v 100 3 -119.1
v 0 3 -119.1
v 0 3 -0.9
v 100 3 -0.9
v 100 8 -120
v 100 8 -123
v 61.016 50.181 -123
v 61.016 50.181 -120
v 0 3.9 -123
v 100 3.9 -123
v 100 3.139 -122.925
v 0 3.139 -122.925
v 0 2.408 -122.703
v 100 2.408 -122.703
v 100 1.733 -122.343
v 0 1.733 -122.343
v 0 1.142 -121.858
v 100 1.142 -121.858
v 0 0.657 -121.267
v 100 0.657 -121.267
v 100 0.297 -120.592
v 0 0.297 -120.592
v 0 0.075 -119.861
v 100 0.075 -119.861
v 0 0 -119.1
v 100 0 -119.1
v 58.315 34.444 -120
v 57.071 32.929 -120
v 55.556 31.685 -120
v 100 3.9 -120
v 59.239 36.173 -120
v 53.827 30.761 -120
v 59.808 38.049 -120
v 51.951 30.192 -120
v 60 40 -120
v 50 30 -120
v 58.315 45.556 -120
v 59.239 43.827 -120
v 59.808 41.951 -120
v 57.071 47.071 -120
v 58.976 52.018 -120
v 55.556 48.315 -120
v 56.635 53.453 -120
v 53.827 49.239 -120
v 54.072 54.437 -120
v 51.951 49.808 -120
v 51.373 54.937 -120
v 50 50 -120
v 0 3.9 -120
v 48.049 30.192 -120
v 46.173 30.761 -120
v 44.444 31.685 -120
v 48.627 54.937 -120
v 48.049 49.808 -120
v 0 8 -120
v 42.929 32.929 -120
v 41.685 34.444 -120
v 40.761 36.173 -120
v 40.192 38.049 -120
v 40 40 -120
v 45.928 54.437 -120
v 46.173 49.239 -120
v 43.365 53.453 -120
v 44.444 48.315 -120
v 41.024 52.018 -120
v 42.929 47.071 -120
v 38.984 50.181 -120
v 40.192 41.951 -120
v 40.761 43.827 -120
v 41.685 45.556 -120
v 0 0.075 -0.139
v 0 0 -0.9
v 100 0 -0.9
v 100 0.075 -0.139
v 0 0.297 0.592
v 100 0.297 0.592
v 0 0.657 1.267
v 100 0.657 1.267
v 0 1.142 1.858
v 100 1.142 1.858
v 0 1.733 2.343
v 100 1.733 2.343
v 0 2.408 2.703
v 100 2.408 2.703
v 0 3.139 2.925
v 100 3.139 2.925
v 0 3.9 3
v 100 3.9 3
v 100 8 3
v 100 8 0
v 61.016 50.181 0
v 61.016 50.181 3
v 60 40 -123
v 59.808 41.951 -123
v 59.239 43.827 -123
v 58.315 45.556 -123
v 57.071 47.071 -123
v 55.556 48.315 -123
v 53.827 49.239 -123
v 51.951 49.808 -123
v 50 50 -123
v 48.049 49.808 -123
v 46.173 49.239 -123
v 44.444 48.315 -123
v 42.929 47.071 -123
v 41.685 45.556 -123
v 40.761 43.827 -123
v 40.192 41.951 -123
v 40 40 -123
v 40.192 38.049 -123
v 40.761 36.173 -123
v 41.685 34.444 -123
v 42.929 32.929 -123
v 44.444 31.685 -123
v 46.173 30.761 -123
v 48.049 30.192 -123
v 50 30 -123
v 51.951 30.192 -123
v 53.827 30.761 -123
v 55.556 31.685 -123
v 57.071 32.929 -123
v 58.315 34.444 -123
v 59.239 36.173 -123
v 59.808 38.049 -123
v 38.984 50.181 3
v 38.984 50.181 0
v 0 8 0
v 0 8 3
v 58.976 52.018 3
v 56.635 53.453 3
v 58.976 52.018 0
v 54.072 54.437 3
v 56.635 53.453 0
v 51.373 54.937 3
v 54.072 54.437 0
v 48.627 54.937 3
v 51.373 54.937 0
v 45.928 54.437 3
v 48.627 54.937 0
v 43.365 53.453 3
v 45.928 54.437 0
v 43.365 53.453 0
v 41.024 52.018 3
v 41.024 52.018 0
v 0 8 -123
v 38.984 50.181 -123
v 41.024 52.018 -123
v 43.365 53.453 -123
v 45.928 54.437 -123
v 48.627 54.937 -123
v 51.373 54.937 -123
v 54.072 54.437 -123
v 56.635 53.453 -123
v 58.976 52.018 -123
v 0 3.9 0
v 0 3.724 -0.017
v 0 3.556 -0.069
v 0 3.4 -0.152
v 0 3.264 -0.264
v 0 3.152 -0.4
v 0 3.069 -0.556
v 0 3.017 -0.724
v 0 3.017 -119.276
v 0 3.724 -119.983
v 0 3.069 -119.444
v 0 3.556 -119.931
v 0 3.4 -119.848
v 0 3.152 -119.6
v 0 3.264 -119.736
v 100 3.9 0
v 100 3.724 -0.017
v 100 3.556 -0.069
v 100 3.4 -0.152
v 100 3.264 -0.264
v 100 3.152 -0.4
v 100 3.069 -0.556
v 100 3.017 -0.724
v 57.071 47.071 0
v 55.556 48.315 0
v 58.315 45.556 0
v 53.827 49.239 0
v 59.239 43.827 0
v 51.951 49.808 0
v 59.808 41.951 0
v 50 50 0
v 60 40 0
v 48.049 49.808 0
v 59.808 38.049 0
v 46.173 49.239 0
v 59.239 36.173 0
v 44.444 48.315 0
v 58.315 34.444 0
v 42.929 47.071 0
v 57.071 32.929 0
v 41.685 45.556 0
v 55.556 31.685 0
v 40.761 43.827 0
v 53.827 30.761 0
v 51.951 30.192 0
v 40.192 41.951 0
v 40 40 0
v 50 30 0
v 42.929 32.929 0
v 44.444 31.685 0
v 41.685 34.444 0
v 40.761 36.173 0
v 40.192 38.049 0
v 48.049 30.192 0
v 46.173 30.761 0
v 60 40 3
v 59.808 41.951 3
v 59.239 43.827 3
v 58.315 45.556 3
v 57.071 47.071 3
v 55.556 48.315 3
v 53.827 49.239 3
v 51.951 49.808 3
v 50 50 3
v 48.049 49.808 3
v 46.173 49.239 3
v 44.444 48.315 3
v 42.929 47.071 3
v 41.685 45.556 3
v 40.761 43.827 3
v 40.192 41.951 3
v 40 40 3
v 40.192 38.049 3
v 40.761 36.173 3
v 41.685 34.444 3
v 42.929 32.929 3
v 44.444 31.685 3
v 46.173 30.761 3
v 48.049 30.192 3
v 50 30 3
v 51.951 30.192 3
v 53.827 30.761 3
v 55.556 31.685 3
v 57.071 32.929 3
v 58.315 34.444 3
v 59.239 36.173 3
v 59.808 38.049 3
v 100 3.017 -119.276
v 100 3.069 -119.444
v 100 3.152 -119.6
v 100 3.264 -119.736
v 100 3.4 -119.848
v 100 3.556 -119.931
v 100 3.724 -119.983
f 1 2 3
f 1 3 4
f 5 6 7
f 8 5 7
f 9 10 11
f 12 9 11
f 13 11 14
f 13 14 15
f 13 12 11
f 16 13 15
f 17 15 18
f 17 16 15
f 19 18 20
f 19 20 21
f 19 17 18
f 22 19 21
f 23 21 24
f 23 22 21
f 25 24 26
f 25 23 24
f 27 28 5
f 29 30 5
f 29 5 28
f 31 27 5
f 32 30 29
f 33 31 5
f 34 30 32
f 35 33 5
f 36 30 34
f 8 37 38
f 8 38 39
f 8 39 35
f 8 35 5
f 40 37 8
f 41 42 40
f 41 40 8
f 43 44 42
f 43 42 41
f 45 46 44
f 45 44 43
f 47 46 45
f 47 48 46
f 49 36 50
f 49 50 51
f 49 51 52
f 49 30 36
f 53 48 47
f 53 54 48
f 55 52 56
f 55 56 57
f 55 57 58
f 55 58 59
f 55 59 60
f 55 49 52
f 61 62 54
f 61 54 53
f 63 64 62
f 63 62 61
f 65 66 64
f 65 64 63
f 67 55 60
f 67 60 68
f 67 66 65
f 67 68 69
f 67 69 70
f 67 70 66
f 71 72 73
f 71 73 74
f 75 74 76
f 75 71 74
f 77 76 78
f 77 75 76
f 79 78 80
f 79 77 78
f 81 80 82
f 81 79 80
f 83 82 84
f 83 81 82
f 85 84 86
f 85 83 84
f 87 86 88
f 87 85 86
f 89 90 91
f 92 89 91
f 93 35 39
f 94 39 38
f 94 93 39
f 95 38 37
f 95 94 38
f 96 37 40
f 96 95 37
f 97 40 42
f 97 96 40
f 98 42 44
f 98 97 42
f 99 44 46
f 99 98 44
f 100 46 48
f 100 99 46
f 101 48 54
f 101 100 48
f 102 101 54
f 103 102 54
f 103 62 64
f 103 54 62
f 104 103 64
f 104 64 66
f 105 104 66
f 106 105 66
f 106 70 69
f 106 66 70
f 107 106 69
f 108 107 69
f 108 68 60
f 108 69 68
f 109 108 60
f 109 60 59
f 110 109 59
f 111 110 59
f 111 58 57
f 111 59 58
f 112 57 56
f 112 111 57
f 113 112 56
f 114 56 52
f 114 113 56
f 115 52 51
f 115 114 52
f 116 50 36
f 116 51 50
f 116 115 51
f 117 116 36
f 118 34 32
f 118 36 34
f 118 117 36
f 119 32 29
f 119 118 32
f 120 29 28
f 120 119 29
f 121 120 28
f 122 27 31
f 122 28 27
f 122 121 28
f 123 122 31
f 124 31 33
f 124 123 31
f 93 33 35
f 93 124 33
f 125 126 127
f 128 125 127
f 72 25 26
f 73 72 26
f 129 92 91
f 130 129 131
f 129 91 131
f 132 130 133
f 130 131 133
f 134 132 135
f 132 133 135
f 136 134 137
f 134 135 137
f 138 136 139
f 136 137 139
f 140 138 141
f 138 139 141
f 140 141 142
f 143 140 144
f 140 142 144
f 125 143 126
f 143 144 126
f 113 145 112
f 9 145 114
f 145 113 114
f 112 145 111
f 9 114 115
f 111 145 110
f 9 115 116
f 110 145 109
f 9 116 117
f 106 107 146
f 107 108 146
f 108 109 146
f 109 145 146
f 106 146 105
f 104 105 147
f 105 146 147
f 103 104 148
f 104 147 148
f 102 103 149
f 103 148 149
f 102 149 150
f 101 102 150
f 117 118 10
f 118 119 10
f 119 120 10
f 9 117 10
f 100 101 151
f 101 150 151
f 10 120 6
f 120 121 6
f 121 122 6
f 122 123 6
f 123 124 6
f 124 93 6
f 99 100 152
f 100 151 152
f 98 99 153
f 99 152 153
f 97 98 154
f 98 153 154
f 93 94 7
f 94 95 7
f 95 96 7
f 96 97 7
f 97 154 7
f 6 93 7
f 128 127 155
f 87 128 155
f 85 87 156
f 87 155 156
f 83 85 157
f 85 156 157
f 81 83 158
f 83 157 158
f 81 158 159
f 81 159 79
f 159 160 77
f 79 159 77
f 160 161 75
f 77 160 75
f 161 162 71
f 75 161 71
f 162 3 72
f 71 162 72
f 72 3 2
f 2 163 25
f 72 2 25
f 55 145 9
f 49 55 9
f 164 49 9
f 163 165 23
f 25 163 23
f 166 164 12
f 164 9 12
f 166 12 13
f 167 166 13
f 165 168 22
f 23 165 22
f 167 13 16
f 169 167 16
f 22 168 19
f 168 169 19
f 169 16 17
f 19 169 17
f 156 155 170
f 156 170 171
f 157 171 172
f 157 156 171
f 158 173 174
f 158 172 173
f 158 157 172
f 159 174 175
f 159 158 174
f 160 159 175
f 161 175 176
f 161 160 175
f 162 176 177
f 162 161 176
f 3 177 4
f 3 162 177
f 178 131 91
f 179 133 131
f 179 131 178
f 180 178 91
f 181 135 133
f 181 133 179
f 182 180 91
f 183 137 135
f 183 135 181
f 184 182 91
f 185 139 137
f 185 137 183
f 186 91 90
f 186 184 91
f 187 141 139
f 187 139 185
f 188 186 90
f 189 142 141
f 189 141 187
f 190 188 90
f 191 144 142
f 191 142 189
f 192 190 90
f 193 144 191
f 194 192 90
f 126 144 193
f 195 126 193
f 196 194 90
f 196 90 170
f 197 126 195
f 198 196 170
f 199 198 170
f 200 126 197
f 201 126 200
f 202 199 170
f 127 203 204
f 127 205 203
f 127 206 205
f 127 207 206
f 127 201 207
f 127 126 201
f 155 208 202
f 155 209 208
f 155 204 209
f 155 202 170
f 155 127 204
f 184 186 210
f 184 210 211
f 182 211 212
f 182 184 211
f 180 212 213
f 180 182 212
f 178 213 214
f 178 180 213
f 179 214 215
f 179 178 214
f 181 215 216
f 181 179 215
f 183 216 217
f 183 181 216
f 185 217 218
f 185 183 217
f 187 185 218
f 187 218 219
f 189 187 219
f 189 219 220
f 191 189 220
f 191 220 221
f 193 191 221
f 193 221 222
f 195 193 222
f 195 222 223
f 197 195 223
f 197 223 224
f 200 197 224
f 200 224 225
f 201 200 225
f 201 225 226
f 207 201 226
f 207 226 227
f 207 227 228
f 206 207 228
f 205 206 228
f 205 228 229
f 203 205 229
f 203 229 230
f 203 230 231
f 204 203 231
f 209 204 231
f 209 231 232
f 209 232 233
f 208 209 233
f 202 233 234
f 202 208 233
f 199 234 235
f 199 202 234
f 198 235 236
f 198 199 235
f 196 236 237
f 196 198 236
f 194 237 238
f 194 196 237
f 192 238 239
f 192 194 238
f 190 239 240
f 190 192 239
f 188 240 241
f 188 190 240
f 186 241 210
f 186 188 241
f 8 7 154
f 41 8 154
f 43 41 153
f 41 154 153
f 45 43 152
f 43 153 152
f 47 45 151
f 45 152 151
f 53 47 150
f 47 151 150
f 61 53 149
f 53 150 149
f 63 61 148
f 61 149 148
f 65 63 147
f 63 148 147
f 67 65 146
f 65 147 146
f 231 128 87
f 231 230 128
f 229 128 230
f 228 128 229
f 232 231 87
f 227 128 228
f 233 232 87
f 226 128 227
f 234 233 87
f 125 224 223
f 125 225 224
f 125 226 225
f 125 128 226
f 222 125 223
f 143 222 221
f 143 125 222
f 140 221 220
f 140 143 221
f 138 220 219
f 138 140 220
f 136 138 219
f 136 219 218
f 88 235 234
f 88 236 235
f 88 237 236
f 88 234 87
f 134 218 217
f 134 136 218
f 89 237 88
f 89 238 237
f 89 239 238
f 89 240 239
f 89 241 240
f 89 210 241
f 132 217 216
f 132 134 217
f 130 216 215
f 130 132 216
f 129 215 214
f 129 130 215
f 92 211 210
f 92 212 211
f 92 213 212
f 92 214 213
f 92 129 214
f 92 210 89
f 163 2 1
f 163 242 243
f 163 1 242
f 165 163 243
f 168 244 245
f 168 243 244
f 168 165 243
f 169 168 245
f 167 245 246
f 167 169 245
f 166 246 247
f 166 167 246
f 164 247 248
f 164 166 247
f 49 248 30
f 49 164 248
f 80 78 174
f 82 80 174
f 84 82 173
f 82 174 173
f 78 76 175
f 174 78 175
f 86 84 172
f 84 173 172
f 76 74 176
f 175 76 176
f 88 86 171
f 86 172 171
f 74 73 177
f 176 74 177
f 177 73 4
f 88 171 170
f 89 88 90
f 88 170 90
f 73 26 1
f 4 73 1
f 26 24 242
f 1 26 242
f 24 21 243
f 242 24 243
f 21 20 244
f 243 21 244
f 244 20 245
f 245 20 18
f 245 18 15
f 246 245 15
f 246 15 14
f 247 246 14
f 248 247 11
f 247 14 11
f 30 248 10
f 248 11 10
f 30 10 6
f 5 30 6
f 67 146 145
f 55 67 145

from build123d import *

# Parameters (mm, degrees)
ESBO_O1_W                      = 100
ESBO_O1_H                      = 120
RESSALTO_EXTRUS_O1_DEPTH       = 3
ARESTA_FLANGE1_STRIP_W         = 13.8
ARESTA_FLANGE1_STRIP_H         = 3
ARESTA_FLANGE1_STRIP_CUT_DEPTH = 100
ARESTA_FLANGE1_DEPTH           = 100
ARESTA_FLANGE2_STRIP_W         = 13.8
ARESTA_FLANGE2_STRIP_H         = 3
ARESTA_FLANGE2_STRIP_CUT_DEPTH = 100
ARESTA_FLANGE2_DEPTH           = 100
CORTE_EXTRUS_O1_DEPTH          = 171.002941151
ESBO_O13_R                     = 10
CORTE_EXTRUS_O2_DEPTH          = 171.002941151
DESDOBRAR1_START               = 3
DESDOBRAR1_OUTLINE_W           = 100
DESDOBRAR1_OUTLINE_H           = 126
DESDOBRAR1_DEPTH               = 53
DESDOBRAR1_2_OUTLINE_R         = 10
DESDOBRAR1_2_DEPTH             = 3
DOBRAR1_START                  = -175
DOBRAR1_OUTLINE_W              = 100
DOBRAR1_OUTLINE_H              = 3
DOBRAR1_DEPTH                  = 52
DOBRAR1_START_2                = 3
DOBRAR1_2_OUTLINE_W            = 100
DOBRAR1_2_OUTLINE_H            = 3
DOBRAR1_2_DEPTH                = 52
DOBRAR1_START_3                = -123
DOBRAR1_3_OUTLINE_R            = 10
DOBRAR1_3_DEPTH                = 3.9
DOBRAR1_START_4                = -0.9
DOBRAR1_4_OUTLINE_R            = 10
DOBRAR1_4_DEPTH                = 3.9
DOBRAR1_START_5                = -1
DOBRAR1_5_DEPTH                = 102


with BuildPart() as part:
    # Esboço1 → Ressalto-extrusão1 (new body)
    with BuildSketch(Plane(origin=(0, 0, 0), x_dir=(1, 0, 0), z_dir=(0, 1, 0))):
        with Locations((50, 60)):
            Rectangle(ESBO_O1_W, ESBO_O1_H)
    extrude(amount=RESSALTO_EXTRUS_O1_DEPTH)

    # Aresta-Flange1: sheet metal written as solids
    # Aresta-Flange1 strip (on a plane across the edge) → Aresta-Flange1 strip cut (cut)
    with BuildSketch(Plane(origin=(0, 3, 0), x_dir=(0, 0, -1), z_dir=(1, 0, 0))):
        with Locations((-6, -1.5)):
            Rectangle(ARESTA_FLANGE1_STRIP_W, ARESTA_FLANGE1_STRIP_H)
    extrude(amount=ARESTA_FLANGE1_STRIP_CUT_DEPTH, mode=Mode.SUBTRACT)

    # Aresta-Flange1 section (on a plane across the edge) → Aresta-Flange1 (add)
    with BuildSketch(Plane(origin=(0, 3, 0), x_dir=(0, 0, -1), z_dir=(1, 0, 0))):
        with BuildLine():
            Line((-3, 0.9), (-3, 52))
            Line((-3, 52), (0, 52))
            Line((0, 52), (0, 0.9))
            ThreePointArc((0, 0.9), (0.263603897, 0.263603897), (0.9, 0))
            Line((0.9, 0), (0.9, -3))
            ThreePointArc((0.9, -3), (-1.857716447, -1.857716447), (-3, 0.9))
        make_face()
    extrude(amount=ARESTA_FLANGE1_DEPTH)

    # Aresta-Flange2: sheet metal written as solids
    # Aresta-Flange2 strip (on a plane across the edge) → Aresta-Flange2 strip cut (cut)
    with BuildSketch(Plane(origin=(100, 3, -120), x_dir=(0, 0, 1), z_dir=(-1, 0, 0))):
        with Locations((-6, -1.5)):
            Rectangle(ARESTA_FLANGE2_STRIP_W, ARESTA_FLANGE2_STRIP_H)
    extrude(amount=ARESTA_FLANGE2_STRIP_CUT_DEPTH, mode=Mode.SUBTRACT)

    # Aresta-Flange2 section (on a plane across the edge) → Aresta-Flange2 (add)
    with BuildSketch(Plane(origin=(100, 3, -120), x_dir=(0, 0, 1), z_dir=(-1, 0, 0))):
        with BuildLine():
            Line((-3, 0.9), (-3, 52))
            Line((-3, 52), (0, 52))
            Line((0, 52), (0, 0.9))
            ThreePointArc((0, 0.9), (0.263603897, 0.263603897), (0.9, 0))
            Line((0.9, 0), (0.9, -3))
            ThreePointArc((0.9, -3), (-1.857716447, -1.857716447), (-3, 0.9))
        make_face()
    extrude(amount=ARESTA_FLANGE2_DEPTH)

    # Esboço11 → Corte-extrusão1 (cut, through all)
    with BuildSketch(Plane.XY.offset(3)):
        with BuildLine():
            Line((0, 55), (0, 8))
            Line((0, 8), (38.984187706, 50.180956709))
            ThreePointArc((38.984187706, 50.180956709), (43.988109725, 53.74253162), (50, 55))
            Line((50, 55), (0, 55))
        make_face()
        with BuildLine():
            Line((61.015812294, 50.180956709), (100, 8))
            Line((100, 8), (100, 55))
            Line((100, 55), (50, 55))
            ThreePointArc((50, 55), (56.011890275, 53.74253162), (61.015812294, 50.180956709))
        make_face()
    extrude(amount=-CORTE_EXTRUS_O1_DEPTH, mode=Mode.SUBTRACT)

    # Esboço13 → Corte-extrusão2 (cut, through all)
    with BuildSketch(Plane.XY.offset(3)):
        with Locations((50, 40)):
            Circle(ESBO_O13_R)
    extrude(amount=-CORTE_EXTRUS_O2_DEPTH, mode=Mode.SUBTRACT)

    # Desdobrar1: read off the stored shape, not the designer's step
    # Desdobrar1 outline → Desdobrar1 (cut)
    with BuildSketch(Plane(origin=(0, 0, 0), x_dir=(1, 0, 0), z_dir=(0, 1, 0)).offset(DESDOBRAR1_START)):
        with Locations((50, 60)):
            Rectangle(DESDOBRAR1_OUTLINE_W, DESDOBRAR1_OUTLINE_H)
    extrude(amount=DESDOBRAR1_DEPTH, mode=Mode.SUBTRACT)

    # Desdobrar1 2 outline → Desdobrar1 2 (add)
    with BuildSketch(Plane(origin=(0, 0, 0), x_dir=(1, 0, 0), z_dir=(0, 1, 0))):
        with BuildLine():
            Line((0, -6.969911184), (38.984187706, -49.150867893))
            ThreePointArc((38.984187706, -49.150867893), (50, -53.969911184), (61.015812294, -49.150867893))
            Line((61.015812294, -49.150867893), (100, -6.969911184))
            Line((100, -6.969911184), (100, 126.969911184))
            Line((100, 126.969911184), (61.015812294, 169.150867893))
            ThreePointArc((61.015812294, 169.150867893), (50, 173.969911184), (38.984187706, 169.150867893))
            Line((38.984187706, 169.150867893), (0, 126.969911184))
            Line((0, 126.969911184), (0, -6.969911184))
        make_face()
        with Locations((50, 158.969911184)):
            Circle(DESDOBRAR1_2_OUTLINE_R, mode=Mode.SUBTRACT)
        with Locations((50, -38.969911184)):
            Circle(DESDOBRAR1_2_OUTLINE_R, mode=Mode.SUBTRACT)
    extrude(amount=DESDOBRAR1_2_DEPTH)

    # Dobrar1: read off the stored shape, not the designer's step
    # Dobrar1 outline → Dobrar1 (cut)
    with BuildSketch(Plane.XY.offset(DOBRAR1_START)):
        with Locations((50, 1.5)):
            Rectangle(DOBRAR1_OUTLINE_W, DOBRAR1_OUTLINE_H)
    extrude(amount=DOBRAR1_DEPTH, mode=Mode.SUBTRACT)

    # Dobrar1 2 outline → Dobrar1 2 (cut)
    with BuildSketch(Plane.XY.offset(DOBRAR1_START_2)):
        with Locations((50, 1.5)):
            Rectangle(DOBRAR1_2_OUTLINE_W, DOBRAR1_2_OUTLINE_H)
    extrude(amount=DOBRAR1_2_DEPTH, mode=Mode.SUBTRACT)

    # Dobrar1 3 outline → Dobrar1 3 (add)
    with BuildSketch(Plane.XY.offset(DOBRAR1_START_3)):
        with BuildLine():
            Line((0, 8), (0, 3))
            Line((0, 3), (100, 3))
            Line((100, 3), (100, 8))
            Line((100, 8), (61.015812294, 50.180956709))
            ThreePointArc((61.015812294, 50.180956709), (50, 55), (38.984187706, 50.180956709))
            Line((38.984187706, 50.180956709), (0, 8))
        make_face()
        with Locations((50, 40)):
            Circle(DOBRAR1_3_OUTLINE_R, mode=Mode.SUBTRACT)
    extrude(amount=DOBRAR1_3_DEPTH)

    # Dobrar1 4 outline → Dobrar1 4 (add)
    with BuildSketch(Plane.XY.offset(DOBRAR1_START_4)):
        with BuildLine():
            Line((0, 8), (0, 3))
            Line((0, 3), (100, 3))
            Line((100, 3), (100, 8))
            Line((100, 8), (61.015812294, 50.180956709))
            ThreePointArc((61.015812294, 50.180956709), (50, 55), (38.984187706, 50.180956709))
            Line((38.984187706, 50.180956709), (0, 8))
        make_face()
        with Locations((50, 40)):
            Circle(DOBRAR1_4_OUTLINE_R, mode=Mode.SUBTRACT)
    extrude(amount=DOBRAR1_4_DEPTH)

    # Dobrar1 5 outline → Dobrar1 5 (cut)
    with BuildSketch(Plane.YZ.offset(DOBRAR1_START_5)):
        with BuildLine():
            Line((56, 0), (3.9, 0))
            ThreePointArc((3.9, 0), (3.263603897, -0.263603897), (3, -0.9))
            Line((3, -0.9), (56, -0.9))
            Line((56, -0.9), (56, 0))
        make_face()
        with BuildLine():
            Line((3.9, 3), (56, 2.999999983))
            Line((56, 2.999999983), (56, 5))
            Line((56, 5), (4e-08, 5))
            Line((4e-08, 5), (0, -0.9))
            ThreePointArc((0, -0.9), (1.142283553, 1.857716447), (3.9, 3))
        make_face()
        with BuildLine():
            Line((56, -120), (56, -119.1))
            Line((56, -119.1), (3, -119.1))
            ThreePointArc((3, -119.1), (3.263603897, -119.736396103), (3.9, -120))
            Line((3.9, -120), (56, -120))
        make_face()
        with BuildLine():
            Line((56, -124), (56, -122.999999983))
            Line((56, -122.999999983), (3.9, -123))
            ThreePointArc((3.9, -123), (1.142283553, -121.857716447), (0, -119.1))
            Line((0, -119.1), (4e-08, -124))
            Line((4e-08, -124), (56, -124))
        make_face()
    extrude(amount=DOBRAR1_5_DEPTH, mode=Mode.SUBTRACT)


solid = part.part
